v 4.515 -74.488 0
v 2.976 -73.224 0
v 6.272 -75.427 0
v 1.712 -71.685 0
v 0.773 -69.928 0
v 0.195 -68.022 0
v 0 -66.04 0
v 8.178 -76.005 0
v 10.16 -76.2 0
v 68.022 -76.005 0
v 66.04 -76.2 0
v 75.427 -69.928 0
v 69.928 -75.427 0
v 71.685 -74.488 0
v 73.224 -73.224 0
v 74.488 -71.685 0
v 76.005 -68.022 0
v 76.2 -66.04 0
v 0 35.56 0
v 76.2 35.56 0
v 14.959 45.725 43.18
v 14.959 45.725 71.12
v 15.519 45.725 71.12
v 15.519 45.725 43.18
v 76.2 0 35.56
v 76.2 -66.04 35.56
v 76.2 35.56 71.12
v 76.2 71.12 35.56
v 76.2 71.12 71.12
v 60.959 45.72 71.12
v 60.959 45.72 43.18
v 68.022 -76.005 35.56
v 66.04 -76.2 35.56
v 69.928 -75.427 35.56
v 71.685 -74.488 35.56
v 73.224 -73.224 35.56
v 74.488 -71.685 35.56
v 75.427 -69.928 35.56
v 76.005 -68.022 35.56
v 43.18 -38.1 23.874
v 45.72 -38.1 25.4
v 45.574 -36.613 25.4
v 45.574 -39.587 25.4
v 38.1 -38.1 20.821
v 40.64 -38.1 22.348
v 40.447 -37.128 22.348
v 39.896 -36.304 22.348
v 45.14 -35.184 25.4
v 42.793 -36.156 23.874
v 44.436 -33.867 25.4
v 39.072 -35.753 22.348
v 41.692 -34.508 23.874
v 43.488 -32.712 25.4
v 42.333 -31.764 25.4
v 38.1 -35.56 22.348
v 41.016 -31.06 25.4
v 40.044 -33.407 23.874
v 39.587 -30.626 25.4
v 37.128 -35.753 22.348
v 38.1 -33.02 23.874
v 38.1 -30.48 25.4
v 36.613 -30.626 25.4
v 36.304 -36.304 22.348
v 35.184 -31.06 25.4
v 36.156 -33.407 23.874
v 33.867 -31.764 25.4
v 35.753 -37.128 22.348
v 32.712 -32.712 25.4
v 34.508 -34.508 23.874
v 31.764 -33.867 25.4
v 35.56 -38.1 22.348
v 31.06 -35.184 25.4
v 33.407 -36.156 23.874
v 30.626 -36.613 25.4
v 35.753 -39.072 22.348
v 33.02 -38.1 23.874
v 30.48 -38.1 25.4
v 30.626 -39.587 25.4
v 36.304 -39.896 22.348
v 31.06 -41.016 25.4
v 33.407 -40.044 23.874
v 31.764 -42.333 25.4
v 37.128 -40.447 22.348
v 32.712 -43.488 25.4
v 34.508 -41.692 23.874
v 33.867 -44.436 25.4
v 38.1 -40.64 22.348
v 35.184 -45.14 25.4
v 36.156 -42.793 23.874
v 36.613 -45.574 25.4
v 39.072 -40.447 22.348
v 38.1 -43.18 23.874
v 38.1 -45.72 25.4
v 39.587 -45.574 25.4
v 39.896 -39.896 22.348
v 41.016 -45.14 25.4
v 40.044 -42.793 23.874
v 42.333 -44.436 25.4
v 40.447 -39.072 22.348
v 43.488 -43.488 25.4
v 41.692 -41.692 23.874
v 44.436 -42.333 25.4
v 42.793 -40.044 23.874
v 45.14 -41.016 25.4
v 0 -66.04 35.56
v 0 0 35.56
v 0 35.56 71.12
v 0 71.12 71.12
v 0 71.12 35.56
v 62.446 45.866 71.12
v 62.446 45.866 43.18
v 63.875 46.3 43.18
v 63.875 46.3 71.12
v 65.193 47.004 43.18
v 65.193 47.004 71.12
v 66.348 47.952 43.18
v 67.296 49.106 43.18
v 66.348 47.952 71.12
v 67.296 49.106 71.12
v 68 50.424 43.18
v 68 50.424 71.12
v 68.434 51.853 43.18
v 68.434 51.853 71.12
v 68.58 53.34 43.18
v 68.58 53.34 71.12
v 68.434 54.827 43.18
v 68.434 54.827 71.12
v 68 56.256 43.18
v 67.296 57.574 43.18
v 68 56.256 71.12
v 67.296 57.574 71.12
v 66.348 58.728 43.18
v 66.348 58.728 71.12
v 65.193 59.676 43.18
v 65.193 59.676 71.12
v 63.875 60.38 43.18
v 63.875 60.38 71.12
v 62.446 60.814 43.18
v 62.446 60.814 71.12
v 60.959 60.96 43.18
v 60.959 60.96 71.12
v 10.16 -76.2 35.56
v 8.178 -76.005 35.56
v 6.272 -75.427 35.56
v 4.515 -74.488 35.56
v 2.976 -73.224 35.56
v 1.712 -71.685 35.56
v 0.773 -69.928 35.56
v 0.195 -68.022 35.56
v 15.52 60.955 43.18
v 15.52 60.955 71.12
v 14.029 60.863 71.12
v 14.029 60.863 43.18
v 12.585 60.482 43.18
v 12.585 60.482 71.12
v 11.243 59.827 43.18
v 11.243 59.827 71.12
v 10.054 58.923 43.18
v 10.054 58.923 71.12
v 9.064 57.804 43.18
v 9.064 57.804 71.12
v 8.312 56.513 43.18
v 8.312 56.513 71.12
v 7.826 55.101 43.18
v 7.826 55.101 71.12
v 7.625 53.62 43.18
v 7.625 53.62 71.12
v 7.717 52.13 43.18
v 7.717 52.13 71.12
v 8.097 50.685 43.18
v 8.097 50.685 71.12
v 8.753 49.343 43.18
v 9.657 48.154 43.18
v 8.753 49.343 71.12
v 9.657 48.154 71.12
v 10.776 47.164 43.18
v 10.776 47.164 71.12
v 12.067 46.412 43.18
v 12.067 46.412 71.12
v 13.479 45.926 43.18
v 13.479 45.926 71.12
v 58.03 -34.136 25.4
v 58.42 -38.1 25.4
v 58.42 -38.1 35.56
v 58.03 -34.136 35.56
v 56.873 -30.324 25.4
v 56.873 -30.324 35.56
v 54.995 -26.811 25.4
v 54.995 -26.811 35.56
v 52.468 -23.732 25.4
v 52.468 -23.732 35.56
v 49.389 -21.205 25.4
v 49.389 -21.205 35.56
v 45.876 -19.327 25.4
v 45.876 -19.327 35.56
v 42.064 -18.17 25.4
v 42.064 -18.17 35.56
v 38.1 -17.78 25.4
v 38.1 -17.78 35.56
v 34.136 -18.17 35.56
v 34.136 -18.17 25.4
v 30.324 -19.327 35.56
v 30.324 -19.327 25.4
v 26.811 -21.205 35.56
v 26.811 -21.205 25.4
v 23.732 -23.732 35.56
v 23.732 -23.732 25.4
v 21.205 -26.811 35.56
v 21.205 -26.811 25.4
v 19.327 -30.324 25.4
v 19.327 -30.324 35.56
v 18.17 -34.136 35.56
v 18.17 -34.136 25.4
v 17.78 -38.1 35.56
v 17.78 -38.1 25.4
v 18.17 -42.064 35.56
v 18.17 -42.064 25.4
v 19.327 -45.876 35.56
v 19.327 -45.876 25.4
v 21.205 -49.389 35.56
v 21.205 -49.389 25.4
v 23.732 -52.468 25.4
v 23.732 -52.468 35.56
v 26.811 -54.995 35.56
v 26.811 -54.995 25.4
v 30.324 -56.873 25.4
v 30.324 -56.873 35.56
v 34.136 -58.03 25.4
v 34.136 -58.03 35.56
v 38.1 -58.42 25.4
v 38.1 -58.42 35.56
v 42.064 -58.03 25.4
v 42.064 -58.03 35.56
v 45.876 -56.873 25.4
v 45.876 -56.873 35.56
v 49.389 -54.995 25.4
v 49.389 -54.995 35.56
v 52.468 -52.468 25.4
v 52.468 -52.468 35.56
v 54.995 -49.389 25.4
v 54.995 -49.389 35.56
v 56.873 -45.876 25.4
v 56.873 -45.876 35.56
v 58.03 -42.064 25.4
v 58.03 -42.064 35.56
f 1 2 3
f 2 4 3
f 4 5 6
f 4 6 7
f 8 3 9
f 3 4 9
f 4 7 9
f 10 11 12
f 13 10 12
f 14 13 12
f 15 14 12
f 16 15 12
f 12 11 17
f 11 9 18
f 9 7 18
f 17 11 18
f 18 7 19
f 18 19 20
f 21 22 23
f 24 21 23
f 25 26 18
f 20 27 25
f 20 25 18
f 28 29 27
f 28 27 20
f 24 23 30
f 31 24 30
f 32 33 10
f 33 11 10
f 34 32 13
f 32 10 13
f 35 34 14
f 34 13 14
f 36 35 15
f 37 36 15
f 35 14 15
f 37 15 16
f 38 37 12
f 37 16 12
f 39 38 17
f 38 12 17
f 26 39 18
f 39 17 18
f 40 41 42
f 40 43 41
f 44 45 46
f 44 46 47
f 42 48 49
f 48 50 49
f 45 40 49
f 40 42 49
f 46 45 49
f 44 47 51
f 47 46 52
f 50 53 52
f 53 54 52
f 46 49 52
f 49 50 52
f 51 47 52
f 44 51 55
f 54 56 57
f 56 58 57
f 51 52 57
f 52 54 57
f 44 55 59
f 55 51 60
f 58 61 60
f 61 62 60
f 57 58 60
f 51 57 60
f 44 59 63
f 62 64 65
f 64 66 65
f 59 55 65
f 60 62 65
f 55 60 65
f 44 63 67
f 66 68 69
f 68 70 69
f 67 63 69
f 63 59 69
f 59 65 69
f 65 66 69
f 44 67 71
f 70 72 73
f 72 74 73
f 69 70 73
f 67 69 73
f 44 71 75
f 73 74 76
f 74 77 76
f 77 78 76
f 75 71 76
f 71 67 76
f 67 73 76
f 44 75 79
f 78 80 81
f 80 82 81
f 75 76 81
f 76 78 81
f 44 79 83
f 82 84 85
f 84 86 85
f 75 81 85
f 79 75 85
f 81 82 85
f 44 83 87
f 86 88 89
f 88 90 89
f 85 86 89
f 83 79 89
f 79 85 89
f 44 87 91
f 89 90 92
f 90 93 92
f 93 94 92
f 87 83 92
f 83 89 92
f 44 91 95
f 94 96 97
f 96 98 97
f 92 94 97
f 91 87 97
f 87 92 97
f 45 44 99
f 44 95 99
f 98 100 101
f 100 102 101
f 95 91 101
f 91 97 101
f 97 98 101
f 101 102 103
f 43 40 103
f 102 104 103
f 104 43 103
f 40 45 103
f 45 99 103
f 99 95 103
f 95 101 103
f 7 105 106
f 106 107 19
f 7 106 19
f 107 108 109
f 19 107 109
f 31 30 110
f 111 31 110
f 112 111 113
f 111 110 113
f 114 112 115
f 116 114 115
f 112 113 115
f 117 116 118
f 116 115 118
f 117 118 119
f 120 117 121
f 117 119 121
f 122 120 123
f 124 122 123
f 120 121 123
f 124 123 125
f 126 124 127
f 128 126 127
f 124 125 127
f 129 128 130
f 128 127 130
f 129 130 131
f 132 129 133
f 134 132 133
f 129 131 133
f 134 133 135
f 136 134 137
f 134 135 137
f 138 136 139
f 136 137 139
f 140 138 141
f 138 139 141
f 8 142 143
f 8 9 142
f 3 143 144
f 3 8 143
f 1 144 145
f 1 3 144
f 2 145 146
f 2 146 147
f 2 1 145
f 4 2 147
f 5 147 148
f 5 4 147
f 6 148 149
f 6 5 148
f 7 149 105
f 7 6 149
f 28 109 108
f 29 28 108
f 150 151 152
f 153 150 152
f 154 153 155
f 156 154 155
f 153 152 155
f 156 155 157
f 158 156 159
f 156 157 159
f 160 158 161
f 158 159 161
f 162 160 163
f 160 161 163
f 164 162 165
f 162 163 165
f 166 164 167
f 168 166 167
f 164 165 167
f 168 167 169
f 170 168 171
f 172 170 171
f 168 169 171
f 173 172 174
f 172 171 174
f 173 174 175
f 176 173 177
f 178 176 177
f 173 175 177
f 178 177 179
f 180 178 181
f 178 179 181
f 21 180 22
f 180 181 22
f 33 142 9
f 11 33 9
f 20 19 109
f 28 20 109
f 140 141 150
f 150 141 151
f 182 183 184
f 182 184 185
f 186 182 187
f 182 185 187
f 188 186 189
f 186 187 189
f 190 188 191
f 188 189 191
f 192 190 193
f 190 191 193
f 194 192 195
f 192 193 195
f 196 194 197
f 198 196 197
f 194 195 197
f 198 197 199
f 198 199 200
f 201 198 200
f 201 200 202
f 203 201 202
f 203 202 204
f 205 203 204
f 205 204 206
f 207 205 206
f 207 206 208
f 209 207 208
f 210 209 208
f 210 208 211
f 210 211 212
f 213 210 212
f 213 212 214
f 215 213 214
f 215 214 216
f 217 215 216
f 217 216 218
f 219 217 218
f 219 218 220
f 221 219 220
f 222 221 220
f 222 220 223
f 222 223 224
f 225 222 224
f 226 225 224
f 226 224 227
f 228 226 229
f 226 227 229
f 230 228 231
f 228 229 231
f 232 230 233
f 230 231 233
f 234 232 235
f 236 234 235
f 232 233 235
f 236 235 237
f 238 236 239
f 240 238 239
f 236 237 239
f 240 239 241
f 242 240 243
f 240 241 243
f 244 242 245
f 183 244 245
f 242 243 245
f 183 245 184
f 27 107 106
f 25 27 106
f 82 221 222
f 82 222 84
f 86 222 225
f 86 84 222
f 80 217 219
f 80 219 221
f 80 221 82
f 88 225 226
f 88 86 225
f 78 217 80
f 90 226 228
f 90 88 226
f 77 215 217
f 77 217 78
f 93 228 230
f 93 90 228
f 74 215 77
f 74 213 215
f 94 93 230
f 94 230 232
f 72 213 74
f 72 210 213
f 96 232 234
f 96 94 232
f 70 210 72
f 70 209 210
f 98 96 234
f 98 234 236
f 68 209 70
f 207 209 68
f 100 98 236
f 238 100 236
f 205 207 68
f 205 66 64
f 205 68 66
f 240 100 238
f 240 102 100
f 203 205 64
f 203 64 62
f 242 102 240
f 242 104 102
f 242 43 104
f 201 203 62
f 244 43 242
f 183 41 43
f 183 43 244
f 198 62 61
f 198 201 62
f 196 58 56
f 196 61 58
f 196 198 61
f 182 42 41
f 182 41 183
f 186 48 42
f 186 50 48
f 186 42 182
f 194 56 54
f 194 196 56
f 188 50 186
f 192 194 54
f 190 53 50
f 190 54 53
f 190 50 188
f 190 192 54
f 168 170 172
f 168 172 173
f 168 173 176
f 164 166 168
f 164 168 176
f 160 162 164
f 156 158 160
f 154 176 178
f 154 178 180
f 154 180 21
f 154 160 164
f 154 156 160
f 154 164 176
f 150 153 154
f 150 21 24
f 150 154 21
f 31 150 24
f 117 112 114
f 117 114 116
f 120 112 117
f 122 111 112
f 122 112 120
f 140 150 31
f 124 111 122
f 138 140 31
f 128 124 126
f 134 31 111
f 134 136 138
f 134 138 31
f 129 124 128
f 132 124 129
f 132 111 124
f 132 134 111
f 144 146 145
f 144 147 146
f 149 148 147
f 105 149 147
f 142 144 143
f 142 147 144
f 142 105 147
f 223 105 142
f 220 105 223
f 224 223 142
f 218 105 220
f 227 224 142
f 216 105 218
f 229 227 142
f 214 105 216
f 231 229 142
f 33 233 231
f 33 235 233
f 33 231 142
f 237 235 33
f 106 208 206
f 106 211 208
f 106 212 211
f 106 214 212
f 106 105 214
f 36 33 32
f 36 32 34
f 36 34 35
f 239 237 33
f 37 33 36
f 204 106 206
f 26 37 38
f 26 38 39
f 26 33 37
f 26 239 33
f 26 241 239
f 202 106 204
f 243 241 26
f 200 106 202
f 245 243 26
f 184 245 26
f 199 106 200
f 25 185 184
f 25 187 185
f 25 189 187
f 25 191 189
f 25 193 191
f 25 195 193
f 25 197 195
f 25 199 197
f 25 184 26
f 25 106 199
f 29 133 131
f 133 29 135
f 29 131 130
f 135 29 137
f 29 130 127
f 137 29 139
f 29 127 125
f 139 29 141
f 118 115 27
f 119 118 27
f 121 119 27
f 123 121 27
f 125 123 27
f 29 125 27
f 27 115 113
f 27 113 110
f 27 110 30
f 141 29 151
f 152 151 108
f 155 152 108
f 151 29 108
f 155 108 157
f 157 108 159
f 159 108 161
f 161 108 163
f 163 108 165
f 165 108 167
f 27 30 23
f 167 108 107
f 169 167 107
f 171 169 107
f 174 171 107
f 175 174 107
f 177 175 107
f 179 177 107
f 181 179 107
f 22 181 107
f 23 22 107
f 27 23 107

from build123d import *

# Parameters (mm, degrees)
F1_DEPTH       = 76.2
F2_DEPTH       = 76.2
F4_D           = 15.24
F4_DEPTH       = 10.16
F4_CBORE_D     = 40.64
F4_CBORE_DEPTH = 10.16
F4_TIP         = 4.578557917
F5_R           = 10.16
F6_R           = 10.16
F8_DEPTH       = 27.94


with BuildPart() as f1:
    # F0 (on Right) → F1 (new body)
    with BuildSketch(Plane.YZ):
        Polygon((0, 35.56), (0, 0), (35.56, 0), (71.12, 35.56), (71.12, 71.12), (35.56, 71.12), align=None)
    extrude(amount=F1_DEPTH)

    # F2 (add): a face of the model
    f2_faces = [f1.faces().sort_by_distance(p)[0] for p in [
        (38.1, 0, 17.78),
    ]]
    extrude(f2_faces, amount=F2_DEPTH)

    # F4
    with Locations(Plane.XY.offset(35.56)):
        with Locations((38.1, -38.1)):
            CounterBoreHole(F4_D / 2, F4_CBORE_D / 2, F4_CBORE_DEPTH, depth=F4_DEPTH)
            with Locations((0, 0, -(F4_DEPTH + F4_TIP / 2))):  # 118° drill point
                Cone(0, F4_D / 2, F4_TIP, mode=Mode.SUBTRACT)

    # F5
    f5_edges = [f1.edges().sort_by_distance(p)[0] for p in [
        (76.2, -76.2, 17.78),
    ]]
    fillet(f5_edges, radius=F5_R)

    # F6
    f6_edges = [f1.edges().sort_by_distance(p)[0] for p in [
        (0, -76.2, 17.78),
    ]]
    fillet(f6_edges, radius=F6_R)

    # F7 (on face) → F8 (cut)
    with BuildSketch(Plane.XY.offset(71.12)):
        with BuildLine():
            Line((60.9591351744, 60.9599999509), (15.5202967077, 60.9548429896))
            ThreePointArc((15.5202967077, 60.9548429896), (7.6251627493, 53.6204525726), (14.9593915626, 45.7251684914))
            Line((14.9593915626, 45.7251684914), (15.5188972549, 45.7251056264))
            Line((15.5188972549, 45.7251056264), (60.9591438178, 45.7200000481))
            ThreePointArc((60.9591438178, 45.7200000481), (68.5799999863, 53.3400043217), (60.9591351744, 60.9599999509))
        make_face()
    extrude(amount=-F8_DEPTH, mode=Mode.SUBTRACT)


solid = f1.part
